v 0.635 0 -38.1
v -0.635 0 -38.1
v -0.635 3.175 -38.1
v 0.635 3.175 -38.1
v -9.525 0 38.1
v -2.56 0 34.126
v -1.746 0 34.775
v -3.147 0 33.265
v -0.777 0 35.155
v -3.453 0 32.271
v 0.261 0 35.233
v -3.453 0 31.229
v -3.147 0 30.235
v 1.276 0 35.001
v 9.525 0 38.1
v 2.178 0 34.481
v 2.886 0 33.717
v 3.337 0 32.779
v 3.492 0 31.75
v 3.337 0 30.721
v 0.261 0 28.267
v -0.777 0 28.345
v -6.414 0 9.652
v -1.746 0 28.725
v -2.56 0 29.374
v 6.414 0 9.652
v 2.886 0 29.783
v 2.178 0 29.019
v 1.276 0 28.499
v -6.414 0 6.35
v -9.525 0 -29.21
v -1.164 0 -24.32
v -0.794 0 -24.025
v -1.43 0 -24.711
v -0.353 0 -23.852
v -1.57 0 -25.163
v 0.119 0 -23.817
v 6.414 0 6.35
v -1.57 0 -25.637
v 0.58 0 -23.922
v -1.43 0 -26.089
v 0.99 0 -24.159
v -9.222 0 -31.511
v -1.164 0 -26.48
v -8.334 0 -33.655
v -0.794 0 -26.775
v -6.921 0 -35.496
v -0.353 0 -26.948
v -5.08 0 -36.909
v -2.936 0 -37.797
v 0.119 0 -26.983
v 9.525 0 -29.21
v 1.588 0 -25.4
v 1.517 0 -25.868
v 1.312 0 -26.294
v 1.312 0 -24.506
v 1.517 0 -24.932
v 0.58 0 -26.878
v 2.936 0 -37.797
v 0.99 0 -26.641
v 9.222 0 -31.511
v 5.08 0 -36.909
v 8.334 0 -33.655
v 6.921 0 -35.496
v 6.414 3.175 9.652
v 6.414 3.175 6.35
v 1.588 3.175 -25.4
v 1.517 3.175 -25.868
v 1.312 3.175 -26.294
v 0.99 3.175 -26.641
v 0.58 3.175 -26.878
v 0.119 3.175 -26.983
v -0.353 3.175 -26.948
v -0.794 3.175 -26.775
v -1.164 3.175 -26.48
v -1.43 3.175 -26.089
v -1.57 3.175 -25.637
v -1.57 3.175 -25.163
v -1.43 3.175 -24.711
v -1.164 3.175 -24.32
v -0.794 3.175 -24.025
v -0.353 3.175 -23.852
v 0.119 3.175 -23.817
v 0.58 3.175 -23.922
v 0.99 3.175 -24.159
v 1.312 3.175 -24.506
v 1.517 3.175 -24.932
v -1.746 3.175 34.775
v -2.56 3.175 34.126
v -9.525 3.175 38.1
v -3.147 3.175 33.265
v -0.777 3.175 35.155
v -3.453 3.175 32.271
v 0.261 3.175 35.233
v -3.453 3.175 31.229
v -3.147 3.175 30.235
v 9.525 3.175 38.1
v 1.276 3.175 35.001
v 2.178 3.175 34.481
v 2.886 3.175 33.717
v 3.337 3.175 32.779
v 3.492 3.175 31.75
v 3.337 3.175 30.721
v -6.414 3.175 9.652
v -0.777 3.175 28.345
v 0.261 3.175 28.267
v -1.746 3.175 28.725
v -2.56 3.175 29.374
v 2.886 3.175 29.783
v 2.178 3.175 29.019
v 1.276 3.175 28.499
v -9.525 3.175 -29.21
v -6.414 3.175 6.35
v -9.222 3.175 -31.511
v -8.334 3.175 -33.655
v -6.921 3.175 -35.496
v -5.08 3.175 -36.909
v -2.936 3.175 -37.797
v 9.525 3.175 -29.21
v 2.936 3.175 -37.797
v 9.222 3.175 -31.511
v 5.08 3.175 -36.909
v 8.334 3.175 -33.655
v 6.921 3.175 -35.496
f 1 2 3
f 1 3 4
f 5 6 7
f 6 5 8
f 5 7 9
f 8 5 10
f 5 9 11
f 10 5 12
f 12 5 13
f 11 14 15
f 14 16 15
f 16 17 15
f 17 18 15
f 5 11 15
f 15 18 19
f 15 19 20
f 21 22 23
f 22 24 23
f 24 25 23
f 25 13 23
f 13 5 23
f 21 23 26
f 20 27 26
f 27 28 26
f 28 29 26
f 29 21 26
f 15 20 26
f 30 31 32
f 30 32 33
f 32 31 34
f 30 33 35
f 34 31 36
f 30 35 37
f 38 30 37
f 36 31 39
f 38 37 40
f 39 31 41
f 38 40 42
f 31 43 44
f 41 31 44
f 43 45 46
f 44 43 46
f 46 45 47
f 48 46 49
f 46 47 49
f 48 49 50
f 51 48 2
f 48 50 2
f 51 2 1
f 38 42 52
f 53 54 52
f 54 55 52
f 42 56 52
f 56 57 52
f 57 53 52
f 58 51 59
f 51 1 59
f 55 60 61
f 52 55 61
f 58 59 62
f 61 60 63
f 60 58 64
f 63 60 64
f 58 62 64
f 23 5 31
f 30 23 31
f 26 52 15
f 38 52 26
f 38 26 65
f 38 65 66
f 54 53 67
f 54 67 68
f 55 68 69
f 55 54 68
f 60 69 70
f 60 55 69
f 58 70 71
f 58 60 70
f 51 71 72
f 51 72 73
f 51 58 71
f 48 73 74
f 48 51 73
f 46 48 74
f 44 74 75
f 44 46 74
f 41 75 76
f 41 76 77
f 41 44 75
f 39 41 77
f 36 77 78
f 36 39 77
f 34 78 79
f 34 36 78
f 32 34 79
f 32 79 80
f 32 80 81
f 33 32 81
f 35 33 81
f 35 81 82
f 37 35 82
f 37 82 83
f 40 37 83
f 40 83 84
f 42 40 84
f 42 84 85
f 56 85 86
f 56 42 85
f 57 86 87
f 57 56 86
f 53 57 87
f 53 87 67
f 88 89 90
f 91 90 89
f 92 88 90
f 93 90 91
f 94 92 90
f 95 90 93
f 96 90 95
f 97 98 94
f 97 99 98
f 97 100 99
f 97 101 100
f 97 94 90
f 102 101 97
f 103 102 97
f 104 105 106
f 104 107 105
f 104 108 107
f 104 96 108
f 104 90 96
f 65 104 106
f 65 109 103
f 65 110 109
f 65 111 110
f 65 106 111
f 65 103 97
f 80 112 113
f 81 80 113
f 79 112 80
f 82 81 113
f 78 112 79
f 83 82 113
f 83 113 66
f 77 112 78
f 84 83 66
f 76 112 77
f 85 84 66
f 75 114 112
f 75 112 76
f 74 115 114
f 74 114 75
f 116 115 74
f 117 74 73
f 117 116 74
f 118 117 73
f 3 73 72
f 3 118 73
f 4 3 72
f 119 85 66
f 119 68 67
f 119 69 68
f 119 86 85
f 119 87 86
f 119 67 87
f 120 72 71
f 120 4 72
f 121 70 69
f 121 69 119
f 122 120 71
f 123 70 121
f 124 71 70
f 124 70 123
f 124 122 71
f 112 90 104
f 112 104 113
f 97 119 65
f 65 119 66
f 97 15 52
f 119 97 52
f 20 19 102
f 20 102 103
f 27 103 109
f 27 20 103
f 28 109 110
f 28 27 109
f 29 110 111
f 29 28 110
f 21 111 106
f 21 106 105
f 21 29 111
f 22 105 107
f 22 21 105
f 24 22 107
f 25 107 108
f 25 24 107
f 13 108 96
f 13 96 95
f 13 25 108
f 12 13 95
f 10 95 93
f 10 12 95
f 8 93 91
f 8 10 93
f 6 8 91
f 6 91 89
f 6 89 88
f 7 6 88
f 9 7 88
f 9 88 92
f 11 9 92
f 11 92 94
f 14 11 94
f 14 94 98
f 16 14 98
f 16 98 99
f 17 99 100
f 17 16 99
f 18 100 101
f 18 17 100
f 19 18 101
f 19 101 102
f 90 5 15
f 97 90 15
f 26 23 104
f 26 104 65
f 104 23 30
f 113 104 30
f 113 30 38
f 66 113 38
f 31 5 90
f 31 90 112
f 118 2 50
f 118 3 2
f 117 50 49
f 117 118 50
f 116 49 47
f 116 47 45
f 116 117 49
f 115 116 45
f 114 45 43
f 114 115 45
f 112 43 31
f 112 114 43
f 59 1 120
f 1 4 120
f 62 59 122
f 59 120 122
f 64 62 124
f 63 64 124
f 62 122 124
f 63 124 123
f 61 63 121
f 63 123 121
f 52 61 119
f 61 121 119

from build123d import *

# Parameters (mm, degrees)
SKETCH1_W           = 19.05
SKETCH1_H           = 76.2
SKETCH1_R           = 1.5875
SKETCH1_R_2         = 3.4925
SKETCH1_W_2         = 12.827
SKETCH1_H_2         = 3.302
BOSS_EXTRUDE1_DEPTH = 3.175
FILLET1_R           = 8.89
FILLET2_R           = 8.89


with BuildPart() as part:
    # Sketch1 → Boss-Extrude1 (new body)
    with BuildSketch(Plane(origin=(0, 0, 0), x_dir=(1, 0, 0), z_dir=(0, 1, 0))):
        Rectangle(SKETCH1_W, SKETCH1_H)
        with Locations((0, 25.4)):
            Circle(SKETCH1_R, mode=Mode.SUBTRACT)
        with Locations((0, -31.75)):
            Circle(SKETCH1_R_2, mode=Mode.SUBTRACT)
        with Locations((0, -8.001)):
            Rectangle(SKETCH1_W_2, SKETCH1_H_2, mode=Mode.SUBTRACT)
    extrude(amount=BOSS_EXTRUDE1_DEPTH)

    # Fillet1
    fillet1_edges = [part.edges().sort_by_distance(p)[0] for p in [
        (9.525, 1.5875, -38.1),
    ]]
    fillet(fillet1_edges, radius=FILLET1_R)

    # Fillet2
    fillet2_edges = [part.edges().sort_by_distance(p)[0] for p in [
        (-9.525, 1.5875, -38.1),
    ]]
    fillet(fillet2_edges, radius=FILLET2_R)


solid = part.part
